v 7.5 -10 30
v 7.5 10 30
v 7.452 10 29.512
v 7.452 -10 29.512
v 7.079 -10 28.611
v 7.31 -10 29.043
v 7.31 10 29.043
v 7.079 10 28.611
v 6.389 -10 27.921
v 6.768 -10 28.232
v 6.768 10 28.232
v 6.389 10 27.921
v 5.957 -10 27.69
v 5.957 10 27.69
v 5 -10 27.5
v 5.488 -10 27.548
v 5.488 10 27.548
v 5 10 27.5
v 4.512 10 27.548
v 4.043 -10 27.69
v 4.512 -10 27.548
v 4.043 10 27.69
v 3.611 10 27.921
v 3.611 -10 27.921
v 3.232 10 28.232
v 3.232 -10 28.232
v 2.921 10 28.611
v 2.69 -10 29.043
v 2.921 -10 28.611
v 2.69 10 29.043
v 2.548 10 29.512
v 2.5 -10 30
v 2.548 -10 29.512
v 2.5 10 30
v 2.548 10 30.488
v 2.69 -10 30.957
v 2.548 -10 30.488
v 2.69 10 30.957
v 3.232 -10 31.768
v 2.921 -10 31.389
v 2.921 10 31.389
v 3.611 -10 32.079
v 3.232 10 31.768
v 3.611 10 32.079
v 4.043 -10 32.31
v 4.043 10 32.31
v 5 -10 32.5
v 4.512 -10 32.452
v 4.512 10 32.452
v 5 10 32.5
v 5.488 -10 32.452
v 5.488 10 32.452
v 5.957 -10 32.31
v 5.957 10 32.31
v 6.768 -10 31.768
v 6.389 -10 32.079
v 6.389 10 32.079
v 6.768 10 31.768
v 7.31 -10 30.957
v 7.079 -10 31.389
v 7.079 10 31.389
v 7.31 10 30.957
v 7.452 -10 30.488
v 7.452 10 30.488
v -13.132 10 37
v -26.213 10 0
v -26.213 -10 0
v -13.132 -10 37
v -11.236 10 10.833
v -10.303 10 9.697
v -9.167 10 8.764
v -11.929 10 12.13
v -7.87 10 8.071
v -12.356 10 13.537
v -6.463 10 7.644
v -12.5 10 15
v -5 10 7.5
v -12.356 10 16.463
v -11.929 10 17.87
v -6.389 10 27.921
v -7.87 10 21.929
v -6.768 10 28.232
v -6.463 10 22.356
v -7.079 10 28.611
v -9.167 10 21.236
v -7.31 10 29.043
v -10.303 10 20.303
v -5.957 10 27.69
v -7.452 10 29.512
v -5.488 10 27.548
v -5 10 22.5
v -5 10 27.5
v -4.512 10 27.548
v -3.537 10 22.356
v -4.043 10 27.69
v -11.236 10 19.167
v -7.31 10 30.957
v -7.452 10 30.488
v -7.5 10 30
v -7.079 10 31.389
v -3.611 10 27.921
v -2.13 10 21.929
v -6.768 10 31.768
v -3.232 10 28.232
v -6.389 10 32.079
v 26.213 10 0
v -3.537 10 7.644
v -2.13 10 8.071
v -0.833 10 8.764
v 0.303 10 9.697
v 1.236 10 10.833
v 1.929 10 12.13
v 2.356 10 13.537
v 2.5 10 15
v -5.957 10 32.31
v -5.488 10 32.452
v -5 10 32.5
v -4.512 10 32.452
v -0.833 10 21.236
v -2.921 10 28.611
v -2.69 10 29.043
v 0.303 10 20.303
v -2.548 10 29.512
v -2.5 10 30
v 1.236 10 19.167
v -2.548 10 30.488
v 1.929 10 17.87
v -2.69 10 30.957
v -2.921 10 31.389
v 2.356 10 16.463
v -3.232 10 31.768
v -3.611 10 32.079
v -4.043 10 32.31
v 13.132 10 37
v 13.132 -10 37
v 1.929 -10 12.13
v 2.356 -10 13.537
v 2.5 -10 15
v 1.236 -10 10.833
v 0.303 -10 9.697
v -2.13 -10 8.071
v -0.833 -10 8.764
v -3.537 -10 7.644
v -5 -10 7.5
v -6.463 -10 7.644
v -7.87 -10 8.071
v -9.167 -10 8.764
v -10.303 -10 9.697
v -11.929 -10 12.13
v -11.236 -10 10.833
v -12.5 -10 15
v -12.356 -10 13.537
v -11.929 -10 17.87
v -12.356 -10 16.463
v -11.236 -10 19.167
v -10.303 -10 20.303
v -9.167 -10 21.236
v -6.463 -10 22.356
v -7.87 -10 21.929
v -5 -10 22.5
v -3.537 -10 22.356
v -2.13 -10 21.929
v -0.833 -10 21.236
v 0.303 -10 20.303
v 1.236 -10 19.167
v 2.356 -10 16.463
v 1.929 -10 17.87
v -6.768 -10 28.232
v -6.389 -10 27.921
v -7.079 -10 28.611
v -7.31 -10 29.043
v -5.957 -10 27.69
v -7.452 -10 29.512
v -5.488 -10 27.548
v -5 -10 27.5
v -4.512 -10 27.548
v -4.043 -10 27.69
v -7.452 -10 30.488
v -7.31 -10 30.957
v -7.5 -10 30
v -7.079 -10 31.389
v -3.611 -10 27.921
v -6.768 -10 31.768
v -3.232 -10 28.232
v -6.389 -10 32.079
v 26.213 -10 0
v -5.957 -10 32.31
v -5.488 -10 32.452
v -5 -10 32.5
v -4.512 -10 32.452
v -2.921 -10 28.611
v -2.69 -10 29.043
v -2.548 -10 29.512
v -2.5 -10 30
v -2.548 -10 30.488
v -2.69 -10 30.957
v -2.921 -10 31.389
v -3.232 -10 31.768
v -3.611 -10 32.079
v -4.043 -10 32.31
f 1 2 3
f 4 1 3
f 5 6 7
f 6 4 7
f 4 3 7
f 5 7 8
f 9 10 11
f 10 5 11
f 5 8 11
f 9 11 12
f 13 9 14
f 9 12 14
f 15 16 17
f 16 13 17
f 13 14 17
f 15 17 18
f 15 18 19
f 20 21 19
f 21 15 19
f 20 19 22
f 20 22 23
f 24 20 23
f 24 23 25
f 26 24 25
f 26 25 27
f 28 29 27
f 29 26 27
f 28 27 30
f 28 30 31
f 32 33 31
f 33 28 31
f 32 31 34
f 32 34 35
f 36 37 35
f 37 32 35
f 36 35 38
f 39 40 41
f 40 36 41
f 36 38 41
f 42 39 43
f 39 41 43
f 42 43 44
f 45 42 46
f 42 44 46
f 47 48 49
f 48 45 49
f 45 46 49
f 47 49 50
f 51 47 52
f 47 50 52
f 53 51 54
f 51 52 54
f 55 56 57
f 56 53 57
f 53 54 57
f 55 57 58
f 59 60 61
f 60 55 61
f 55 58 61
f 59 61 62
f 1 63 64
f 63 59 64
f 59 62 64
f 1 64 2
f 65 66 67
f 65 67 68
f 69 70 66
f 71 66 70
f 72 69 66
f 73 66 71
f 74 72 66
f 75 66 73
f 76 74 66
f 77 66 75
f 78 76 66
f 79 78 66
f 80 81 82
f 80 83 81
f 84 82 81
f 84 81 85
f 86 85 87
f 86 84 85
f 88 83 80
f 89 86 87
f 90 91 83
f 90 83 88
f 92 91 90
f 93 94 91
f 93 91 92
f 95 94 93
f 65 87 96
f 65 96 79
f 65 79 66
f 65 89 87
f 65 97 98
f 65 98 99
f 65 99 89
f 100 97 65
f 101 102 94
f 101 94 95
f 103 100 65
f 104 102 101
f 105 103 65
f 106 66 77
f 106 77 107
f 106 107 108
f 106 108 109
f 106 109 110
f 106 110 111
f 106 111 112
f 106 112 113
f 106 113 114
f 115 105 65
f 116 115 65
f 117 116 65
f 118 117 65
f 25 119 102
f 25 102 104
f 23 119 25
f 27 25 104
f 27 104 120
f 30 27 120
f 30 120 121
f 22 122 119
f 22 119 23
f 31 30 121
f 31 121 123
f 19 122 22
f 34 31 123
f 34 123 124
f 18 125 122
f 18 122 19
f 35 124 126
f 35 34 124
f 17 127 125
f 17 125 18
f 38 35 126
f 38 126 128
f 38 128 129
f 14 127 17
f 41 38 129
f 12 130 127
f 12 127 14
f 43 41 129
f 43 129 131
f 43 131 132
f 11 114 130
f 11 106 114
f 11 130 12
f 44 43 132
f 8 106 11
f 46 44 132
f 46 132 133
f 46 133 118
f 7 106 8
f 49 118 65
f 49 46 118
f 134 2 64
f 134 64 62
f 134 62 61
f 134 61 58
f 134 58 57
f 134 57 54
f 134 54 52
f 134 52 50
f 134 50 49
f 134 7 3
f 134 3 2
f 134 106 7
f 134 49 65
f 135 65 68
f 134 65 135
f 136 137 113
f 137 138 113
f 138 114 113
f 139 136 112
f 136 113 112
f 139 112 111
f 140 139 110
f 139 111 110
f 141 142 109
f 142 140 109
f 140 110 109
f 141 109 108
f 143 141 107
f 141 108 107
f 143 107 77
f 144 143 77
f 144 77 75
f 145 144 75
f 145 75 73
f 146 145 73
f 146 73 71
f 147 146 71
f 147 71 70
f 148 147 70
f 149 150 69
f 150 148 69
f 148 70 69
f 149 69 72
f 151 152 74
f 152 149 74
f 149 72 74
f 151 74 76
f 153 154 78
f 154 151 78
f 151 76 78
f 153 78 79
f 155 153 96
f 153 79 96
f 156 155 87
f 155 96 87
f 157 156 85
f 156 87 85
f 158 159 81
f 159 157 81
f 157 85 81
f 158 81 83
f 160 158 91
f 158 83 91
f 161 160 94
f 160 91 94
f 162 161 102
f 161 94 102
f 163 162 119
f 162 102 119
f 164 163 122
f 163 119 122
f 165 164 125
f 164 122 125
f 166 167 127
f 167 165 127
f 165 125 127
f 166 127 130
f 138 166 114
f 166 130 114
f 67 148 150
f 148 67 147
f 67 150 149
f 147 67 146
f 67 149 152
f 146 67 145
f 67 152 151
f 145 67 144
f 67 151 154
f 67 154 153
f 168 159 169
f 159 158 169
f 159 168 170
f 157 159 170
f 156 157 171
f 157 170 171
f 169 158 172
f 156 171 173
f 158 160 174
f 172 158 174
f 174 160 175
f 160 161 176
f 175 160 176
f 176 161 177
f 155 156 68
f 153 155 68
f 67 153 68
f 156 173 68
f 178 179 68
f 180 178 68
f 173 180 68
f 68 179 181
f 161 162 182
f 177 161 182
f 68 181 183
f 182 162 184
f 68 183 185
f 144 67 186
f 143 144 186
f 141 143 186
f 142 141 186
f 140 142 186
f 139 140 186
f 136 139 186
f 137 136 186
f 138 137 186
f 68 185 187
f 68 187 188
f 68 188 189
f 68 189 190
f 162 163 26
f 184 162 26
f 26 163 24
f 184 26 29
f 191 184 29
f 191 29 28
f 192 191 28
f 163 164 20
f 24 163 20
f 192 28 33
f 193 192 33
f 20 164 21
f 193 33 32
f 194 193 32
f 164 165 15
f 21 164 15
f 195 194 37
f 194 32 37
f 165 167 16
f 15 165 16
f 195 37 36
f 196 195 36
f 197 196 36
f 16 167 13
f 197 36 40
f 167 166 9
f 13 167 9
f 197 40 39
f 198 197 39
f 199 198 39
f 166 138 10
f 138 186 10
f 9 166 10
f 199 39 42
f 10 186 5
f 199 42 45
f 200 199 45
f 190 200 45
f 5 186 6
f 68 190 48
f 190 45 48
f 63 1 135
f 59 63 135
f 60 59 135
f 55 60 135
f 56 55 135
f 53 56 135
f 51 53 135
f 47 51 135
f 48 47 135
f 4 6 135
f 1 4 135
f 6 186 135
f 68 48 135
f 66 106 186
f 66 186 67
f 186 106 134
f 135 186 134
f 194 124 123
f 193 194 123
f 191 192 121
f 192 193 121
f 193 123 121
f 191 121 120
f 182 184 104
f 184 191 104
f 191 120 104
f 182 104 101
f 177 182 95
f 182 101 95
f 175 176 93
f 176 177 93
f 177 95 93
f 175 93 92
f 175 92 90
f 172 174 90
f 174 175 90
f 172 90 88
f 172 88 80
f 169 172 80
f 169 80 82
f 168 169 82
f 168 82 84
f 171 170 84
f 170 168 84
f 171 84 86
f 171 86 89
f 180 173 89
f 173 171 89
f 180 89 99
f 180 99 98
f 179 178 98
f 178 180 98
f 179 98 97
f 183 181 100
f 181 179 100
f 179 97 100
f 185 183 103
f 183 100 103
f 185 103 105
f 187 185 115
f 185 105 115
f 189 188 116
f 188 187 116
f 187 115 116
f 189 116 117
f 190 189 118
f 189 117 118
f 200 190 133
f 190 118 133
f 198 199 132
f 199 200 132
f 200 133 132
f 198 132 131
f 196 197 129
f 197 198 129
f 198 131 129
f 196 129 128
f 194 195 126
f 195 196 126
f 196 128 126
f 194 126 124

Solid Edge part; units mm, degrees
sketch "Sketch1" plane through (0, 0, 0) normal (0, -1, 0) x (1, 0, 0)
  line L0 (-13.1317, 37) -> (0, 37)
  line L1 (13.1317, 37) -> (0, 37)
  line L2 (26.2132, 0) -> (13.1317, 37)
  line L3 (0, 0) -> (26.2132, 0)
  line L4 (0, 0) -> (-26.2132, 0)
  line L5 (-26.2132, 0) -> (-13.1317, 37)
  circle A0 centre (-5, 30) radius 2.5
  circle A1 centre (5, 30) radius 2.5
  circle A2 centre (-5, 15) radius 7.5
  dimension "D1" = 15
  dimension "D2" = 15
  dimension "D3" = 7
  dimension "D4" = 10
  dimension "D5" = 10
extrude "Protrusion1" add sketch "Sketch1" along normal mid plane 20
